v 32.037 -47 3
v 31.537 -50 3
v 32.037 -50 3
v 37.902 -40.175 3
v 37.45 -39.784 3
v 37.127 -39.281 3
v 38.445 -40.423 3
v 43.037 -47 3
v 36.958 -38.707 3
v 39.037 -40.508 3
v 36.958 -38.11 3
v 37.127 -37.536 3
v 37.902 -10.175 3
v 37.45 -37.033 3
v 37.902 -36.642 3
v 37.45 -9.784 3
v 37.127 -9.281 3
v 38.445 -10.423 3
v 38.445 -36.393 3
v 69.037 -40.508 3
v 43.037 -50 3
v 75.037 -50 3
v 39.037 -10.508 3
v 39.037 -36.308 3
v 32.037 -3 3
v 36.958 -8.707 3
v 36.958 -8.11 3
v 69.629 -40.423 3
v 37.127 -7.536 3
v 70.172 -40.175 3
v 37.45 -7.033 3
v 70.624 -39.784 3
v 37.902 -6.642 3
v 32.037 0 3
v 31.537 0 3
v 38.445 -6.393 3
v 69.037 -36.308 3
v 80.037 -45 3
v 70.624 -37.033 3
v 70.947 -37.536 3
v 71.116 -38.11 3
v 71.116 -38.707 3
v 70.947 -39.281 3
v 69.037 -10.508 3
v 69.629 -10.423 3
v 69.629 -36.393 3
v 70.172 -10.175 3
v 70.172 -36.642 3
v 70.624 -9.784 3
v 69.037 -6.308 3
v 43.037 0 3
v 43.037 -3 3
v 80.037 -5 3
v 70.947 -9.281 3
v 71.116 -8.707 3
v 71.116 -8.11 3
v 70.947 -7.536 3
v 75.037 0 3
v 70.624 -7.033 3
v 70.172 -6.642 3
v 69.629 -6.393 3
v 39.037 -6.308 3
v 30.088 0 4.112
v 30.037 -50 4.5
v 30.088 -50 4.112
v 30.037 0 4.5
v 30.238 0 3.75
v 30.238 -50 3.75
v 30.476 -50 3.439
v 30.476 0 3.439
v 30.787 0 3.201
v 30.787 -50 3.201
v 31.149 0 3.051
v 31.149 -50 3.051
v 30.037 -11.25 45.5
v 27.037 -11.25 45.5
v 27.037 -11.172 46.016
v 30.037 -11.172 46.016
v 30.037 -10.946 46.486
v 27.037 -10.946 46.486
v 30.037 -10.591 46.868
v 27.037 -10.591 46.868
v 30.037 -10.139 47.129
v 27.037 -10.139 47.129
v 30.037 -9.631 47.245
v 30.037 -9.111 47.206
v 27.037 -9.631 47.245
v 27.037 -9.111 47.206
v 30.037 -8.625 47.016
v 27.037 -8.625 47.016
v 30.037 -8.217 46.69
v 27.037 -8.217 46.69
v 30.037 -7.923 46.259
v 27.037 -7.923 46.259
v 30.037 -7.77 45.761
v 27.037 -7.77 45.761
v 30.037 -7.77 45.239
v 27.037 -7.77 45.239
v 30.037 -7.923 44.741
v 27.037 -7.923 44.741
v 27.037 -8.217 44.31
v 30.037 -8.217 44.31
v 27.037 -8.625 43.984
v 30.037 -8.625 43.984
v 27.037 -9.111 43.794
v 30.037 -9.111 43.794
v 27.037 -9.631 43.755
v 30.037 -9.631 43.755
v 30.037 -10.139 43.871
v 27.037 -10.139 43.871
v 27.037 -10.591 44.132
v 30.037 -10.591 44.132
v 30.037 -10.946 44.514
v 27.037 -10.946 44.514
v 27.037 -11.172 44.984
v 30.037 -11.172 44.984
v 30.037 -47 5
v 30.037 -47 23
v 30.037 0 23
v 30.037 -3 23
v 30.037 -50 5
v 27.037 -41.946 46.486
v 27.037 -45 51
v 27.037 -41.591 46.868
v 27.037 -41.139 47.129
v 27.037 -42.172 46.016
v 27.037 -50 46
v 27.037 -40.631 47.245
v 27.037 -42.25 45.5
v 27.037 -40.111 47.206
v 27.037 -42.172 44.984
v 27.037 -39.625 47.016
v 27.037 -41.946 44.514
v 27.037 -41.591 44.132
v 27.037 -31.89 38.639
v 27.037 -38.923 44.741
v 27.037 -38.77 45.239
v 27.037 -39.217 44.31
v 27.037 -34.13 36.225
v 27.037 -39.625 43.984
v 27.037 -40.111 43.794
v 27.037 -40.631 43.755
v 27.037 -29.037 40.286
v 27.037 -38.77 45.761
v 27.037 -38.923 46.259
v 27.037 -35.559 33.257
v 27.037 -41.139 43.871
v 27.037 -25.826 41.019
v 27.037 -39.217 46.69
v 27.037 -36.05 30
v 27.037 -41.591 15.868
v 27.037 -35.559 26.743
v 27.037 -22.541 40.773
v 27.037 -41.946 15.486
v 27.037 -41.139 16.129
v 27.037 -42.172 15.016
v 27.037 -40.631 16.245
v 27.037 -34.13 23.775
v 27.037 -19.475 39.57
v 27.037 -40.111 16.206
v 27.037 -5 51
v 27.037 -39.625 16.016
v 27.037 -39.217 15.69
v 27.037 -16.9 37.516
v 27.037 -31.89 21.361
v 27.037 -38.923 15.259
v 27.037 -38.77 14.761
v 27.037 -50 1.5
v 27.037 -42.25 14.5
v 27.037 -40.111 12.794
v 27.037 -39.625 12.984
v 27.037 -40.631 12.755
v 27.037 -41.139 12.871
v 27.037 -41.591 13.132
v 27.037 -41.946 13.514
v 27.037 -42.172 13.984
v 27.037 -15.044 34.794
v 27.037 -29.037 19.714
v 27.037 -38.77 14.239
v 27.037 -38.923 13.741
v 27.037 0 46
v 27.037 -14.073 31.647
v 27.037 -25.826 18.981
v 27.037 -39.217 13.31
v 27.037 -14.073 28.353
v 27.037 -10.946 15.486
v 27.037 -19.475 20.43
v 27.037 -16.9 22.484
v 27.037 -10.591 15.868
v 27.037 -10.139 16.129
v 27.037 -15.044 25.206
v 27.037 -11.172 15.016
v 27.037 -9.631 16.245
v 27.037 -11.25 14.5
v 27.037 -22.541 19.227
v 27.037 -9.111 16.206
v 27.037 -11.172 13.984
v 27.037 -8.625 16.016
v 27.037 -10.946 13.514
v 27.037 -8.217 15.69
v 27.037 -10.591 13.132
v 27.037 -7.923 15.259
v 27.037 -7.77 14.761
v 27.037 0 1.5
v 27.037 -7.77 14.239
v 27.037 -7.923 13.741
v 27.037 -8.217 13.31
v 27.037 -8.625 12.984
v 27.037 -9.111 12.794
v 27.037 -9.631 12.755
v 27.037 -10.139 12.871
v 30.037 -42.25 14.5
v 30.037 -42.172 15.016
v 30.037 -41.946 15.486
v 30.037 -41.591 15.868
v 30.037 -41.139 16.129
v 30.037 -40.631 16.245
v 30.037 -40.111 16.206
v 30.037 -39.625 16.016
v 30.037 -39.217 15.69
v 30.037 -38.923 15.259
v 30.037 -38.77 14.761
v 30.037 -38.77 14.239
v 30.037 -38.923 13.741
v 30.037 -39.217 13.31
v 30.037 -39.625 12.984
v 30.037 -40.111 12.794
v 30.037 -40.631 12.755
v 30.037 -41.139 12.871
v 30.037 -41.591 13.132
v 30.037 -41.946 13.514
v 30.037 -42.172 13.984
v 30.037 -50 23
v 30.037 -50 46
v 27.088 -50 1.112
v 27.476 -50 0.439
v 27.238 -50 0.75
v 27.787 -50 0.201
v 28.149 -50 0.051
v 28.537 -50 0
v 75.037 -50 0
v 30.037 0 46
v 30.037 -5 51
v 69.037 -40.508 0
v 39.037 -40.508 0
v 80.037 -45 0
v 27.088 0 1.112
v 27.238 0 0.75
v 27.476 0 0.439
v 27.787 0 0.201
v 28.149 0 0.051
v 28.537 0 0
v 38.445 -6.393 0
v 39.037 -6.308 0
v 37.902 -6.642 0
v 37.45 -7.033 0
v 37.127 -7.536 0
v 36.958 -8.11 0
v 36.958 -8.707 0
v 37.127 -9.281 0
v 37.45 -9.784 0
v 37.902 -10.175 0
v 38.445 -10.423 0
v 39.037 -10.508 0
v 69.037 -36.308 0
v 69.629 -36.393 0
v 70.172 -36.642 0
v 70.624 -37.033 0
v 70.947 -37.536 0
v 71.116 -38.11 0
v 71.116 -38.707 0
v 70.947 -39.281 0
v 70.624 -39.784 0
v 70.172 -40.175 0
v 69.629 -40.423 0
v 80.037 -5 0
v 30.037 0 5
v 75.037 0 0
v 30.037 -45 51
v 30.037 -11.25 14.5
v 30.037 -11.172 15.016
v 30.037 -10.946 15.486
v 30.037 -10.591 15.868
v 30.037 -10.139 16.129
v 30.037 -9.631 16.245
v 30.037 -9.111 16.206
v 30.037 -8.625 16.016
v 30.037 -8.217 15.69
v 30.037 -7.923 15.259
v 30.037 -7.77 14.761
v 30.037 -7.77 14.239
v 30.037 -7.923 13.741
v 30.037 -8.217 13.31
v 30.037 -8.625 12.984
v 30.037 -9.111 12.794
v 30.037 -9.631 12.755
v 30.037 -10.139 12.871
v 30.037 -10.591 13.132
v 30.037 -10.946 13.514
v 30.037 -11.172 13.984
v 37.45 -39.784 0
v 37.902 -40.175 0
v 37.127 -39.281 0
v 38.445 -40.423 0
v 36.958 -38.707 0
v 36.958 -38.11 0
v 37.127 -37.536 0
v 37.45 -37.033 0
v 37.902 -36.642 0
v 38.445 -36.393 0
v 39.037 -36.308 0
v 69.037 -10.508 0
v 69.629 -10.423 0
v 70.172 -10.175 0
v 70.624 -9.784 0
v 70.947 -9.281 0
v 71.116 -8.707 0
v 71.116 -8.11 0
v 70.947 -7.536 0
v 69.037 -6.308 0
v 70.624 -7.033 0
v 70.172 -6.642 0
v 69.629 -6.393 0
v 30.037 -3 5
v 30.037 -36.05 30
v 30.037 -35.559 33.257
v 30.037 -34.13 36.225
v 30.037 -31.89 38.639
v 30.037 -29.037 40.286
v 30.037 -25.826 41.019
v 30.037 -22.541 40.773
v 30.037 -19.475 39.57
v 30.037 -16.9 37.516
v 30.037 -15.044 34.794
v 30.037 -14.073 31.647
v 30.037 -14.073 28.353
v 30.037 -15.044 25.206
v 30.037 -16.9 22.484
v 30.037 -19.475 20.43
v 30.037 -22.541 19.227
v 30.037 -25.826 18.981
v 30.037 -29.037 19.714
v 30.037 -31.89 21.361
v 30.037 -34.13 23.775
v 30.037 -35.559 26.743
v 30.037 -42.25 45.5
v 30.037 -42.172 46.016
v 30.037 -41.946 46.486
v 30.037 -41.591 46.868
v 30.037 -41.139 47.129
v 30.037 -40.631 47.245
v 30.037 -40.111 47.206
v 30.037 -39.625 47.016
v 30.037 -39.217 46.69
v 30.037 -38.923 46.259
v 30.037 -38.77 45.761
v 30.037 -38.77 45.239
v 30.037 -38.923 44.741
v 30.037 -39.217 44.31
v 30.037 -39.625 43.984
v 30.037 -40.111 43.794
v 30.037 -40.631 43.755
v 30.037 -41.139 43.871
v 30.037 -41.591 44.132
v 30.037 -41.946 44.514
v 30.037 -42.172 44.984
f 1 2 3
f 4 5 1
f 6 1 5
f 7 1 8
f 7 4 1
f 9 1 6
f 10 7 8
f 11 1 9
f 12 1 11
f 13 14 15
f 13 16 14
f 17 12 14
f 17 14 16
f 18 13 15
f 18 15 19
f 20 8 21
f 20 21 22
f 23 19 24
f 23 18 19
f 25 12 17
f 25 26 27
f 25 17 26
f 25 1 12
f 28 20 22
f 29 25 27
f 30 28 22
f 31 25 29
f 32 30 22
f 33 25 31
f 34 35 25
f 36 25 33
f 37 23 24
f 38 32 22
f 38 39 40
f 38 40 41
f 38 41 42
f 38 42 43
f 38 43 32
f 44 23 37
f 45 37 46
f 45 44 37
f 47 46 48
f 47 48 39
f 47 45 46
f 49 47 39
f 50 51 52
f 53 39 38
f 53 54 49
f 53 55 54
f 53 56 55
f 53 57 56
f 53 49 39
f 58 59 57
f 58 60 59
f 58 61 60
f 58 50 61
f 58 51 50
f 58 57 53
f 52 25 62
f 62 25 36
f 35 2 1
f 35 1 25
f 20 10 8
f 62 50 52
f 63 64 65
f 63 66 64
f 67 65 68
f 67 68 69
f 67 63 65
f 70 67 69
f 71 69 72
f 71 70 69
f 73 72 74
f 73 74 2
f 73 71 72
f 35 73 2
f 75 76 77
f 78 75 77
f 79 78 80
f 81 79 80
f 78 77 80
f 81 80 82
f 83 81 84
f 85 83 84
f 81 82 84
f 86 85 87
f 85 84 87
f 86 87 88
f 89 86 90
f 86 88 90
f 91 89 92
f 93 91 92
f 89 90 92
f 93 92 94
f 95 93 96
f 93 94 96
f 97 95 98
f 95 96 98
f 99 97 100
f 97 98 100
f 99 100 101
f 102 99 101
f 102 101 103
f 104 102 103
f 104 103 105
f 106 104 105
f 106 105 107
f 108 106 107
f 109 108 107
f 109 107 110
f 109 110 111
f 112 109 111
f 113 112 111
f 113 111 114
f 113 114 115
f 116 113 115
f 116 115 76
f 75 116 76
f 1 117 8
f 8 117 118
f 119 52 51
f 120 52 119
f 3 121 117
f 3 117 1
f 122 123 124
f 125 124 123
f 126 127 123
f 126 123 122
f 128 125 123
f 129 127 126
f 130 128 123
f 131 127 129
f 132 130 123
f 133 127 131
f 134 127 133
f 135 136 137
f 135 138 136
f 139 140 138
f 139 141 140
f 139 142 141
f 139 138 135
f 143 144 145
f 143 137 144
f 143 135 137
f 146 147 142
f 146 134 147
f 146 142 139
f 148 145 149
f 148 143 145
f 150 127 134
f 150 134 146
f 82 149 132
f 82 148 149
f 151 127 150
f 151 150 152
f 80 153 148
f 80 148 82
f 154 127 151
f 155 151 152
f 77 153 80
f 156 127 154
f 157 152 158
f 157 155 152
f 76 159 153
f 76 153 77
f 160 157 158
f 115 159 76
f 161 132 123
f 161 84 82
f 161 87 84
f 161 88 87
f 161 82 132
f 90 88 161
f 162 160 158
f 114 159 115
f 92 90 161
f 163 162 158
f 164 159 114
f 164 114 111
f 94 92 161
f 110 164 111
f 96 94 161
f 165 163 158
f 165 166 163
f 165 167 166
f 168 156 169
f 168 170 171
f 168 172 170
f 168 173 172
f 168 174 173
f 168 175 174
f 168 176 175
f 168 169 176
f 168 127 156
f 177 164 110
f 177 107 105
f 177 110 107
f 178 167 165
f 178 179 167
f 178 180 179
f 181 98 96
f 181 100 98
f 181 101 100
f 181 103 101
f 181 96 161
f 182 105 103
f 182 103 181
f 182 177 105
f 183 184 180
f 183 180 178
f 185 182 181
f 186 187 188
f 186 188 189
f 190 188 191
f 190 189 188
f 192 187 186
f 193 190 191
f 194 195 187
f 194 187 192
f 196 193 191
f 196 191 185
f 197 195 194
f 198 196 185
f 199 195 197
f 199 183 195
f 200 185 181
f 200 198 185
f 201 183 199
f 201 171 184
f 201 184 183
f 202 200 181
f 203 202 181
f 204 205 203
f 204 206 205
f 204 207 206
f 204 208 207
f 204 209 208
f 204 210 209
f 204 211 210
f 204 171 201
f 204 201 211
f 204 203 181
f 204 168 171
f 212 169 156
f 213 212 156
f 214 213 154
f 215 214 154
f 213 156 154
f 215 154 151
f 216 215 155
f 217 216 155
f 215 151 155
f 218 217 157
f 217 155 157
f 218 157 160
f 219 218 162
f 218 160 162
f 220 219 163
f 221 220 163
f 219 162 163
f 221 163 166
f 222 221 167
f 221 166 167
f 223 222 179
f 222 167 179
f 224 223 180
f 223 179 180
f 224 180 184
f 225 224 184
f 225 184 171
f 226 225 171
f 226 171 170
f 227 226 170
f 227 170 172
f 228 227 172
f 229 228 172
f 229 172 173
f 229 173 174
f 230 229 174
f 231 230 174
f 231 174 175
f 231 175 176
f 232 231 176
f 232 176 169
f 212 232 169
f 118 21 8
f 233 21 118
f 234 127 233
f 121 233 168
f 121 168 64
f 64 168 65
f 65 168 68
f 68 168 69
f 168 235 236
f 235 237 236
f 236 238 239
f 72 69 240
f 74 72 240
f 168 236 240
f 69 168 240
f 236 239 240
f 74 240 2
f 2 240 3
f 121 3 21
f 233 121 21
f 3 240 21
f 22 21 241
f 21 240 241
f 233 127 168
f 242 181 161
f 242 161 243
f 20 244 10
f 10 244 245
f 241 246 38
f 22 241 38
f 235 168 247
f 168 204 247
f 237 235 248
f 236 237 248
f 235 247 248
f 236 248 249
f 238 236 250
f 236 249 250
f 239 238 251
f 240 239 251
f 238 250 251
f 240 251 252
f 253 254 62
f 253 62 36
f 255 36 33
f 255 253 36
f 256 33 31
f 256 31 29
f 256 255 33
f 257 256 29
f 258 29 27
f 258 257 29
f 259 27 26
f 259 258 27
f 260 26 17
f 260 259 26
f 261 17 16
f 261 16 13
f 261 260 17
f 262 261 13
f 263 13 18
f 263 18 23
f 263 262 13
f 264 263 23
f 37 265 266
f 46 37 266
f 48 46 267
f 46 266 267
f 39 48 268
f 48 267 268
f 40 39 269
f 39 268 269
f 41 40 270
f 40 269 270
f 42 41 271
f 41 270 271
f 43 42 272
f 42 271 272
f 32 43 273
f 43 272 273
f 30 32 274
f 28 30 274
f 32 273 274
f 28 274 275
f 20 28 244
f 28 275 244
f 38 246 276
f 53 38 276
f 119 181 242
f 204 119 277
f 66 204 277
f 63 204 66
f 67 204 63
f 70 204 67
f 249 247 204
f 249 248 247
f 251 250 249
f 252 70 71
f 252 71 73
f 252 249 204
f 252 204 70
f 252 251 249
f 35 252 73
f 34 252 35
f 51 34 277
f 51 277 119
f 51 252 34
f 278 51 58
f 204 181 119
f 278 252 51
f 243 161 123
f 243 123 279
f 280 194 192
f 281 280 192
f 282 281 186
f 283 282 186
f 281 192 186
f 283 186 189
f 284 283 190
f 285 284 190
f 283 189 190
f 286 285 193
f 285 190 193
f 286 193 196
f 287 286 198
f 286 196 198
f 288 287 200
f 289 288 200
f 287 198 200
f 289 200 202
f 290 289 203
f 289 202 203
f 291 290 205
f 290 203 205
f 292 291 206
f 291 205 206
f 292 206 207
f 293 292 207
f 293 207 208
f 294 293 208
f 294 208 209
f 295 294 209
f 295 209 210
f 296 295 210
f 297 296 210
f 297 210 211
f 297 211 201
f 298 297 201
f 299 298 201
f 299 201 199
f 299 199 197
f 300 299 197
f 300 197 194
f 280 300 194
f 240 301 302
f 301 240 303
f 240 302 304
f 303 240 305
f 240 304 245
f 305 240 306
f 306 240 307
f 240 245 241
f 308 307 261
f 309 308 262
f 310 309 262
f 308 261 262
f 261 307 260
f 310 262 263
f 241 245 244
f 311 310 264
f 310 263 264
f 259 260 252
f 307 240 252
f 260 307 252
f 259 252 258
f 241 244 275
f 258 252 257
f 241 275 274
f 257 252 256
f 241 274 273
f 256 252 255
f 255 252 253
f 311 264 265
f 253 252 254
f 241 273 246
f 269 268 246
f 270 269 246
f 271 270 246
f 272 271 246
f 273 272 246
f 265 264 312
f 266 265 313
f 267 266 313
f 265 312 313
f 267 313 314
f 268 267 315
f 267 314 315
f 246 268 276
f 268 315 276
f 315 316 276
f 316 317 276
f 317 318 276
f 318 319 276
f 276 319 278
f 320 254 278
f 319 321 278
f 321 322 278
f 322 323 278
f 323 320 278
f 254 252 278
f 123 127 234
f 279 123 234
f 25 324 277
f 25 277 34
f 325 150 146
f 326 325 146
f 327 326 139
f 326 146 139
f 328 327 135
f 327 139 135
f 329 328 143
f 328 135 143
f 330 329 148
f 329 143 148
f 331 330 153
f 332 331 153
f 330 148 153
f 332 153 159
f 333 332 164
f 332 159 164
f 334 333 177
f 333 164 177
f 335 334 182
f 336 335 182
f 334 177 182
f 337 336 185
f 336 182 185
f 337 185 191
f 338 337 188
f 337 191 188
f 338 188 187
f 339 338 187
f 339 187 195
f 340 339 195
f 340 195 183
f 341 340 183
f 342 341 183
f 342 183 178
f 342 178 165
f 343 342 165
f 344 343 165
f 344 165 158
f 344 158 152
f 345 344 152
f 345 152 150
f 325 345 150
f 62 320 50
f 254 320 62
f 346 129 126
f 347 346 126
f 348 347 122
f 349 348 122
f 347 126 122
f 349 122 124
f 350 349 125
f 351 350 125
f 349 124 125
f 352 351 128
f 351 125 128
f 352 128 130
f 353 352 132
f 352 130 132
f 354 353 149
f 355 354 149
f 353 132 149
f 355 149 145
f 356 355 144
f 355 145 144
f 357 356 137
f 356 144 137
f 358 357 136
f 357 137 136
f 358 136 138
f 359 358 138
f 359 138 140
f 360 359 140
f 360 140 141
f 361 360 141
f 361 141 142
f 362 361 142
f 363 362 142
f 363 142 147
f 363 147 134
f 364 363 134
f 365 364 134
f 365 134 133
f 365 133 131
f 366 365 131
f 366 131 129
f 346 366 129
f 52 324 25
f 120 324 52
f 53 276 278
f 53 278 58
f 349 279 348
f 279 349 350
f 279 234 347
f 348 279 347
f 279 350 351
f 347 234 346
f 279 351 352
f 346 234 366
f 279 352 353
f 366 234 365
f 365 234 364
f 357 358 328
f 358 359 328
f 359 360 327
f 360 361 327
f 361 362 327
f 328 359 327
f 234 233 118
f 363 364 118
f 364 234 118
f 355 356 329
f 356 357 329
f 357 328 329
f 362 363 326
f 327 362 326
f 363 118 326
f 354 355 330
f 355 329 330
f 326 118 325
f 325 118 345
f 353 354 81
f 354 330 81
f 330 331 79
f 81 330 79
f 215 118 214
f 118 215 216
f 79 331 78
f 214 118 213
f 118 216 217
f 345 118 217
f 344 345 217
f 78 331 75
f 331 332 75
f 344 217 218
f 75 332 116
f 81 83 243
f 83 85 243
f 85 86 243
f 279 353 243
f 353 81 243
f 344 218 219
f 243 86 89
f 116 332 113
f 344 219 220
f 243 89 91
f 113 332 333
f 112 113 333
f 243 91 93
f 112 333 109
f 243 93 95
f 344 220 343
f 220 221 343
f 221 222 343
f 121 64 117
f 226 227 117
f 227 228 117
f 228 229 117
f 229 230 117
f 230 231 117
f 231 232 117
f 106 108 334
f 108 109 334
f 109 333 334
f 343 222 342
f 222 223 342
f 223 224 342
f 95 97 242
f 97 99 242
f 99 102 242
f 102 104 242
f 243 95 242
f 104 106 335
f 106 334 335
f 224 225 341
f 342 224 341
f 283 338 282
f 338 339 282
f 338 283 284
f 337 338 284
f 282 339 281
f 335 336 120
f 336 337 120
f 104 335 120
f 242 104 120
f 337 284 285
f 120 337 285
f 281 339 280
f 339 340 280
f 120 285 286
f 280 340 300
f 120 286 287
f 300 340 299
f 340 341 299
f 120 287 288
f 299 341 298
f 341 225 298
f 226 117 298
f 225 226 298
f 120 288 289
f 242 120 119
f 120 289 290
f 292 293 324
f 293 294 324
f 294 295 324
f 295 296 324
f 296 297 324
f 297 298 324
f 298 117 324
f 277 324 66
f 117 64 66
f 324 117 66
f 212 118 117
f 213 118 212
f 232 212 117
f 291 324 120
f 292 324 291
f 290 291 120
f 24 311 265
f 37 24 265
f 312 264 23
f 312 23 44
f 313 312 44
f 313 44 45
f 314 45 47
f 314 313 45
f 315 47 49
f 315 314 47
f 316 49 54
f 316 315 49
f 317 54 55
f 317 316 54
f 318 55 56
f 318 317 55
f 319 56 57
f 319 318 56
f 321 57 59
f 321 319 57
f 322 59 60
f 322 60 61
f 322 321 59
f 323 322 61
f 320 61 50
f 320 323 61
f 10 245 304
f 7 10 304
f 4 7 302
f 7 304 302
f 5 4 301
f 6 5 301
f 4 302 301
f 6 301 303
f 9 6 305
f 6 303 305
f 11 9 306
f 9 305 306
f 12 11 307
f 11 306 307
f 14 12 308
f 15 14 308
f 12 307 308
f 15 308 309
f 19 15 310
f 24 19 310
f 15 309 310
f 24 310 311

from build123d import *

# Parameters (mm, degrees)
ESQUISSE1_W                = 53
ESQUISSE1_H                = 50
BOSS_EXTRU_1_DEPTH         = 3
ESQUISSE2_W                = 3
ESQUISSE2_H                = 50
BOSS_EXTRU_2_DEPTH         = 48
ESQUISSE3_R                = 11.05
ESQUISSE3_R_2              = 1.75
ENL_V_MAT_EXTRU_1_DEPTH    = 49
CHANFREIN1_SIZE            = 5
BOSS_EXTRU_3_DEPTH         = 3
R_P_TITION_LIN_AIRE1_COUNT = 2
R_P_TITION_LIN_AIRE1_PITCH = 47
CONG_3_R                   = 1.5


with BuildPart() as part:
    # Esquisse1 → Boss.-Extru.1 (new body)
    with BuildSketch(Plane.XY):
        with Locations((53.536991909, -25)):
            Rectangle(ESQUISSE1_W, ESQUISSE1_H)
        with BuildLine():
            Line((39.036991909, -10.508361759), (69.036991909, -10.508361759))
            ThreePointArc((69.036991909, -10.508361759), (71.136991909, -8.408361759), (69.036991909, -6.308361759))
            Line((69.036991909, -6.308361759), (39.036991909, -6.308361759))
            ThreePointArc((39.036991909, -6.308361759), (36.936991909, -8.408361759), (39.036991909, -10.508361759))
        make_face(mode=Mode.SUBTRACT)
        with BuildLine():
            Line((39.036991909, -36.308361759), (69.036991909, -36.308361759))
            ThreePointArc((69.036991909, -36.308361759), (71.136991909, -38.408361759), (69.036991909, -40.508361759))
            Line((69.036991909, -40.508361759), (39.036991909, -40.508361759))
            ThreePointArc((39.036991909, -40.508361759), (36.936991909, -38.408361759), (39.036991909, -36.308361759))
        make_face(mode=Mode.SUBTRACT)
    extrude(amount=BOSS_EXTRU_1_DEPTH)

    # Esquisse2 → Boss.-Extru.2 (add)
    with BuildSketch(Plane.XY.offset(3)):
        with Locations((28.536991909, -25)):
            Rectangle(ESQUISSE2_W, ESQUISSE2_H)
    extrude(amount=BOSS_EXTRU_2_DEPTH)

    # Esquisse3 → Enlèv. mat.-Extru.1 (cut)
    with BuildSketch(Plane.ZY.offset(-27.036991909)):
        with Locations(Location((30, -25, 0), (0, 0, 270))):
            Circle(ESQUISSE3_R)
        with Locations(Location((14.5, -9.5, 0), (0, 0, 270))):
            Circle(ESQUISSE3_R_2)
        with Locations(Location((45.5, -9.5, 0), (0, 0, 270))):
            Circle(ESQUISSE3_R_2)
        with Locations(Location((45.5, -40.5, 0), (0, 0, 270))):
            Circle(ESQUISSE3_R_2)
        with Locations(Location((14.5, -40.5, 0), (0, 0, 270))):
            Circle(ESQUISSE3_R_2)
    extrude(amount=-ENL_V_MAT_EXTRU_1_DEPTH, mode=Mode.SUBTRACT)

    # Chanfrein1
    chanfrein1_edges = [part.edges().sort_by_distance(p)[0] for p in [
        (80.036991909, -50, 1.5),
        (80.036991909, 0, 1.5),
        (28.536991909, -50, 51),
        (28.536991909, 0, 51),
    ]]
    chamfer(chanfrein1_edges, length=CHANFREIN1_SIZE)

    # Esquisse4 → Boss.-Extru.3 (add)
    with BuildSketch(Plane.XZ.offset(50)):
        Polygon((30.036991909, 5), (32.036991909, 3), (43.036991909, 3), (30.036991909, 23), align=None)
    boss_extru_3 = extrude(amount=-BOSS_EXTRU_3_DEPTH)

    # Répétition linéaire1: Boss.-Extru.3 ×2
    with Locations(*[(0, i * R_P_TITION_LIN_AIRE1_PITCH, 0) for i in range(1, R_P_TITION_LIN_AIRE1_COUNT)]):
        add(boss_extru_3)

    # Congé3
    cong_3_edges = [part.edges().sort_by_distance(p)[0] for p in [
        (27.036991909, -25, 0),
        (30.036991909, -25, 3),
    ]]
    fillet(cong_3_edges, radius=CONG_3_R)


solid = part.part
